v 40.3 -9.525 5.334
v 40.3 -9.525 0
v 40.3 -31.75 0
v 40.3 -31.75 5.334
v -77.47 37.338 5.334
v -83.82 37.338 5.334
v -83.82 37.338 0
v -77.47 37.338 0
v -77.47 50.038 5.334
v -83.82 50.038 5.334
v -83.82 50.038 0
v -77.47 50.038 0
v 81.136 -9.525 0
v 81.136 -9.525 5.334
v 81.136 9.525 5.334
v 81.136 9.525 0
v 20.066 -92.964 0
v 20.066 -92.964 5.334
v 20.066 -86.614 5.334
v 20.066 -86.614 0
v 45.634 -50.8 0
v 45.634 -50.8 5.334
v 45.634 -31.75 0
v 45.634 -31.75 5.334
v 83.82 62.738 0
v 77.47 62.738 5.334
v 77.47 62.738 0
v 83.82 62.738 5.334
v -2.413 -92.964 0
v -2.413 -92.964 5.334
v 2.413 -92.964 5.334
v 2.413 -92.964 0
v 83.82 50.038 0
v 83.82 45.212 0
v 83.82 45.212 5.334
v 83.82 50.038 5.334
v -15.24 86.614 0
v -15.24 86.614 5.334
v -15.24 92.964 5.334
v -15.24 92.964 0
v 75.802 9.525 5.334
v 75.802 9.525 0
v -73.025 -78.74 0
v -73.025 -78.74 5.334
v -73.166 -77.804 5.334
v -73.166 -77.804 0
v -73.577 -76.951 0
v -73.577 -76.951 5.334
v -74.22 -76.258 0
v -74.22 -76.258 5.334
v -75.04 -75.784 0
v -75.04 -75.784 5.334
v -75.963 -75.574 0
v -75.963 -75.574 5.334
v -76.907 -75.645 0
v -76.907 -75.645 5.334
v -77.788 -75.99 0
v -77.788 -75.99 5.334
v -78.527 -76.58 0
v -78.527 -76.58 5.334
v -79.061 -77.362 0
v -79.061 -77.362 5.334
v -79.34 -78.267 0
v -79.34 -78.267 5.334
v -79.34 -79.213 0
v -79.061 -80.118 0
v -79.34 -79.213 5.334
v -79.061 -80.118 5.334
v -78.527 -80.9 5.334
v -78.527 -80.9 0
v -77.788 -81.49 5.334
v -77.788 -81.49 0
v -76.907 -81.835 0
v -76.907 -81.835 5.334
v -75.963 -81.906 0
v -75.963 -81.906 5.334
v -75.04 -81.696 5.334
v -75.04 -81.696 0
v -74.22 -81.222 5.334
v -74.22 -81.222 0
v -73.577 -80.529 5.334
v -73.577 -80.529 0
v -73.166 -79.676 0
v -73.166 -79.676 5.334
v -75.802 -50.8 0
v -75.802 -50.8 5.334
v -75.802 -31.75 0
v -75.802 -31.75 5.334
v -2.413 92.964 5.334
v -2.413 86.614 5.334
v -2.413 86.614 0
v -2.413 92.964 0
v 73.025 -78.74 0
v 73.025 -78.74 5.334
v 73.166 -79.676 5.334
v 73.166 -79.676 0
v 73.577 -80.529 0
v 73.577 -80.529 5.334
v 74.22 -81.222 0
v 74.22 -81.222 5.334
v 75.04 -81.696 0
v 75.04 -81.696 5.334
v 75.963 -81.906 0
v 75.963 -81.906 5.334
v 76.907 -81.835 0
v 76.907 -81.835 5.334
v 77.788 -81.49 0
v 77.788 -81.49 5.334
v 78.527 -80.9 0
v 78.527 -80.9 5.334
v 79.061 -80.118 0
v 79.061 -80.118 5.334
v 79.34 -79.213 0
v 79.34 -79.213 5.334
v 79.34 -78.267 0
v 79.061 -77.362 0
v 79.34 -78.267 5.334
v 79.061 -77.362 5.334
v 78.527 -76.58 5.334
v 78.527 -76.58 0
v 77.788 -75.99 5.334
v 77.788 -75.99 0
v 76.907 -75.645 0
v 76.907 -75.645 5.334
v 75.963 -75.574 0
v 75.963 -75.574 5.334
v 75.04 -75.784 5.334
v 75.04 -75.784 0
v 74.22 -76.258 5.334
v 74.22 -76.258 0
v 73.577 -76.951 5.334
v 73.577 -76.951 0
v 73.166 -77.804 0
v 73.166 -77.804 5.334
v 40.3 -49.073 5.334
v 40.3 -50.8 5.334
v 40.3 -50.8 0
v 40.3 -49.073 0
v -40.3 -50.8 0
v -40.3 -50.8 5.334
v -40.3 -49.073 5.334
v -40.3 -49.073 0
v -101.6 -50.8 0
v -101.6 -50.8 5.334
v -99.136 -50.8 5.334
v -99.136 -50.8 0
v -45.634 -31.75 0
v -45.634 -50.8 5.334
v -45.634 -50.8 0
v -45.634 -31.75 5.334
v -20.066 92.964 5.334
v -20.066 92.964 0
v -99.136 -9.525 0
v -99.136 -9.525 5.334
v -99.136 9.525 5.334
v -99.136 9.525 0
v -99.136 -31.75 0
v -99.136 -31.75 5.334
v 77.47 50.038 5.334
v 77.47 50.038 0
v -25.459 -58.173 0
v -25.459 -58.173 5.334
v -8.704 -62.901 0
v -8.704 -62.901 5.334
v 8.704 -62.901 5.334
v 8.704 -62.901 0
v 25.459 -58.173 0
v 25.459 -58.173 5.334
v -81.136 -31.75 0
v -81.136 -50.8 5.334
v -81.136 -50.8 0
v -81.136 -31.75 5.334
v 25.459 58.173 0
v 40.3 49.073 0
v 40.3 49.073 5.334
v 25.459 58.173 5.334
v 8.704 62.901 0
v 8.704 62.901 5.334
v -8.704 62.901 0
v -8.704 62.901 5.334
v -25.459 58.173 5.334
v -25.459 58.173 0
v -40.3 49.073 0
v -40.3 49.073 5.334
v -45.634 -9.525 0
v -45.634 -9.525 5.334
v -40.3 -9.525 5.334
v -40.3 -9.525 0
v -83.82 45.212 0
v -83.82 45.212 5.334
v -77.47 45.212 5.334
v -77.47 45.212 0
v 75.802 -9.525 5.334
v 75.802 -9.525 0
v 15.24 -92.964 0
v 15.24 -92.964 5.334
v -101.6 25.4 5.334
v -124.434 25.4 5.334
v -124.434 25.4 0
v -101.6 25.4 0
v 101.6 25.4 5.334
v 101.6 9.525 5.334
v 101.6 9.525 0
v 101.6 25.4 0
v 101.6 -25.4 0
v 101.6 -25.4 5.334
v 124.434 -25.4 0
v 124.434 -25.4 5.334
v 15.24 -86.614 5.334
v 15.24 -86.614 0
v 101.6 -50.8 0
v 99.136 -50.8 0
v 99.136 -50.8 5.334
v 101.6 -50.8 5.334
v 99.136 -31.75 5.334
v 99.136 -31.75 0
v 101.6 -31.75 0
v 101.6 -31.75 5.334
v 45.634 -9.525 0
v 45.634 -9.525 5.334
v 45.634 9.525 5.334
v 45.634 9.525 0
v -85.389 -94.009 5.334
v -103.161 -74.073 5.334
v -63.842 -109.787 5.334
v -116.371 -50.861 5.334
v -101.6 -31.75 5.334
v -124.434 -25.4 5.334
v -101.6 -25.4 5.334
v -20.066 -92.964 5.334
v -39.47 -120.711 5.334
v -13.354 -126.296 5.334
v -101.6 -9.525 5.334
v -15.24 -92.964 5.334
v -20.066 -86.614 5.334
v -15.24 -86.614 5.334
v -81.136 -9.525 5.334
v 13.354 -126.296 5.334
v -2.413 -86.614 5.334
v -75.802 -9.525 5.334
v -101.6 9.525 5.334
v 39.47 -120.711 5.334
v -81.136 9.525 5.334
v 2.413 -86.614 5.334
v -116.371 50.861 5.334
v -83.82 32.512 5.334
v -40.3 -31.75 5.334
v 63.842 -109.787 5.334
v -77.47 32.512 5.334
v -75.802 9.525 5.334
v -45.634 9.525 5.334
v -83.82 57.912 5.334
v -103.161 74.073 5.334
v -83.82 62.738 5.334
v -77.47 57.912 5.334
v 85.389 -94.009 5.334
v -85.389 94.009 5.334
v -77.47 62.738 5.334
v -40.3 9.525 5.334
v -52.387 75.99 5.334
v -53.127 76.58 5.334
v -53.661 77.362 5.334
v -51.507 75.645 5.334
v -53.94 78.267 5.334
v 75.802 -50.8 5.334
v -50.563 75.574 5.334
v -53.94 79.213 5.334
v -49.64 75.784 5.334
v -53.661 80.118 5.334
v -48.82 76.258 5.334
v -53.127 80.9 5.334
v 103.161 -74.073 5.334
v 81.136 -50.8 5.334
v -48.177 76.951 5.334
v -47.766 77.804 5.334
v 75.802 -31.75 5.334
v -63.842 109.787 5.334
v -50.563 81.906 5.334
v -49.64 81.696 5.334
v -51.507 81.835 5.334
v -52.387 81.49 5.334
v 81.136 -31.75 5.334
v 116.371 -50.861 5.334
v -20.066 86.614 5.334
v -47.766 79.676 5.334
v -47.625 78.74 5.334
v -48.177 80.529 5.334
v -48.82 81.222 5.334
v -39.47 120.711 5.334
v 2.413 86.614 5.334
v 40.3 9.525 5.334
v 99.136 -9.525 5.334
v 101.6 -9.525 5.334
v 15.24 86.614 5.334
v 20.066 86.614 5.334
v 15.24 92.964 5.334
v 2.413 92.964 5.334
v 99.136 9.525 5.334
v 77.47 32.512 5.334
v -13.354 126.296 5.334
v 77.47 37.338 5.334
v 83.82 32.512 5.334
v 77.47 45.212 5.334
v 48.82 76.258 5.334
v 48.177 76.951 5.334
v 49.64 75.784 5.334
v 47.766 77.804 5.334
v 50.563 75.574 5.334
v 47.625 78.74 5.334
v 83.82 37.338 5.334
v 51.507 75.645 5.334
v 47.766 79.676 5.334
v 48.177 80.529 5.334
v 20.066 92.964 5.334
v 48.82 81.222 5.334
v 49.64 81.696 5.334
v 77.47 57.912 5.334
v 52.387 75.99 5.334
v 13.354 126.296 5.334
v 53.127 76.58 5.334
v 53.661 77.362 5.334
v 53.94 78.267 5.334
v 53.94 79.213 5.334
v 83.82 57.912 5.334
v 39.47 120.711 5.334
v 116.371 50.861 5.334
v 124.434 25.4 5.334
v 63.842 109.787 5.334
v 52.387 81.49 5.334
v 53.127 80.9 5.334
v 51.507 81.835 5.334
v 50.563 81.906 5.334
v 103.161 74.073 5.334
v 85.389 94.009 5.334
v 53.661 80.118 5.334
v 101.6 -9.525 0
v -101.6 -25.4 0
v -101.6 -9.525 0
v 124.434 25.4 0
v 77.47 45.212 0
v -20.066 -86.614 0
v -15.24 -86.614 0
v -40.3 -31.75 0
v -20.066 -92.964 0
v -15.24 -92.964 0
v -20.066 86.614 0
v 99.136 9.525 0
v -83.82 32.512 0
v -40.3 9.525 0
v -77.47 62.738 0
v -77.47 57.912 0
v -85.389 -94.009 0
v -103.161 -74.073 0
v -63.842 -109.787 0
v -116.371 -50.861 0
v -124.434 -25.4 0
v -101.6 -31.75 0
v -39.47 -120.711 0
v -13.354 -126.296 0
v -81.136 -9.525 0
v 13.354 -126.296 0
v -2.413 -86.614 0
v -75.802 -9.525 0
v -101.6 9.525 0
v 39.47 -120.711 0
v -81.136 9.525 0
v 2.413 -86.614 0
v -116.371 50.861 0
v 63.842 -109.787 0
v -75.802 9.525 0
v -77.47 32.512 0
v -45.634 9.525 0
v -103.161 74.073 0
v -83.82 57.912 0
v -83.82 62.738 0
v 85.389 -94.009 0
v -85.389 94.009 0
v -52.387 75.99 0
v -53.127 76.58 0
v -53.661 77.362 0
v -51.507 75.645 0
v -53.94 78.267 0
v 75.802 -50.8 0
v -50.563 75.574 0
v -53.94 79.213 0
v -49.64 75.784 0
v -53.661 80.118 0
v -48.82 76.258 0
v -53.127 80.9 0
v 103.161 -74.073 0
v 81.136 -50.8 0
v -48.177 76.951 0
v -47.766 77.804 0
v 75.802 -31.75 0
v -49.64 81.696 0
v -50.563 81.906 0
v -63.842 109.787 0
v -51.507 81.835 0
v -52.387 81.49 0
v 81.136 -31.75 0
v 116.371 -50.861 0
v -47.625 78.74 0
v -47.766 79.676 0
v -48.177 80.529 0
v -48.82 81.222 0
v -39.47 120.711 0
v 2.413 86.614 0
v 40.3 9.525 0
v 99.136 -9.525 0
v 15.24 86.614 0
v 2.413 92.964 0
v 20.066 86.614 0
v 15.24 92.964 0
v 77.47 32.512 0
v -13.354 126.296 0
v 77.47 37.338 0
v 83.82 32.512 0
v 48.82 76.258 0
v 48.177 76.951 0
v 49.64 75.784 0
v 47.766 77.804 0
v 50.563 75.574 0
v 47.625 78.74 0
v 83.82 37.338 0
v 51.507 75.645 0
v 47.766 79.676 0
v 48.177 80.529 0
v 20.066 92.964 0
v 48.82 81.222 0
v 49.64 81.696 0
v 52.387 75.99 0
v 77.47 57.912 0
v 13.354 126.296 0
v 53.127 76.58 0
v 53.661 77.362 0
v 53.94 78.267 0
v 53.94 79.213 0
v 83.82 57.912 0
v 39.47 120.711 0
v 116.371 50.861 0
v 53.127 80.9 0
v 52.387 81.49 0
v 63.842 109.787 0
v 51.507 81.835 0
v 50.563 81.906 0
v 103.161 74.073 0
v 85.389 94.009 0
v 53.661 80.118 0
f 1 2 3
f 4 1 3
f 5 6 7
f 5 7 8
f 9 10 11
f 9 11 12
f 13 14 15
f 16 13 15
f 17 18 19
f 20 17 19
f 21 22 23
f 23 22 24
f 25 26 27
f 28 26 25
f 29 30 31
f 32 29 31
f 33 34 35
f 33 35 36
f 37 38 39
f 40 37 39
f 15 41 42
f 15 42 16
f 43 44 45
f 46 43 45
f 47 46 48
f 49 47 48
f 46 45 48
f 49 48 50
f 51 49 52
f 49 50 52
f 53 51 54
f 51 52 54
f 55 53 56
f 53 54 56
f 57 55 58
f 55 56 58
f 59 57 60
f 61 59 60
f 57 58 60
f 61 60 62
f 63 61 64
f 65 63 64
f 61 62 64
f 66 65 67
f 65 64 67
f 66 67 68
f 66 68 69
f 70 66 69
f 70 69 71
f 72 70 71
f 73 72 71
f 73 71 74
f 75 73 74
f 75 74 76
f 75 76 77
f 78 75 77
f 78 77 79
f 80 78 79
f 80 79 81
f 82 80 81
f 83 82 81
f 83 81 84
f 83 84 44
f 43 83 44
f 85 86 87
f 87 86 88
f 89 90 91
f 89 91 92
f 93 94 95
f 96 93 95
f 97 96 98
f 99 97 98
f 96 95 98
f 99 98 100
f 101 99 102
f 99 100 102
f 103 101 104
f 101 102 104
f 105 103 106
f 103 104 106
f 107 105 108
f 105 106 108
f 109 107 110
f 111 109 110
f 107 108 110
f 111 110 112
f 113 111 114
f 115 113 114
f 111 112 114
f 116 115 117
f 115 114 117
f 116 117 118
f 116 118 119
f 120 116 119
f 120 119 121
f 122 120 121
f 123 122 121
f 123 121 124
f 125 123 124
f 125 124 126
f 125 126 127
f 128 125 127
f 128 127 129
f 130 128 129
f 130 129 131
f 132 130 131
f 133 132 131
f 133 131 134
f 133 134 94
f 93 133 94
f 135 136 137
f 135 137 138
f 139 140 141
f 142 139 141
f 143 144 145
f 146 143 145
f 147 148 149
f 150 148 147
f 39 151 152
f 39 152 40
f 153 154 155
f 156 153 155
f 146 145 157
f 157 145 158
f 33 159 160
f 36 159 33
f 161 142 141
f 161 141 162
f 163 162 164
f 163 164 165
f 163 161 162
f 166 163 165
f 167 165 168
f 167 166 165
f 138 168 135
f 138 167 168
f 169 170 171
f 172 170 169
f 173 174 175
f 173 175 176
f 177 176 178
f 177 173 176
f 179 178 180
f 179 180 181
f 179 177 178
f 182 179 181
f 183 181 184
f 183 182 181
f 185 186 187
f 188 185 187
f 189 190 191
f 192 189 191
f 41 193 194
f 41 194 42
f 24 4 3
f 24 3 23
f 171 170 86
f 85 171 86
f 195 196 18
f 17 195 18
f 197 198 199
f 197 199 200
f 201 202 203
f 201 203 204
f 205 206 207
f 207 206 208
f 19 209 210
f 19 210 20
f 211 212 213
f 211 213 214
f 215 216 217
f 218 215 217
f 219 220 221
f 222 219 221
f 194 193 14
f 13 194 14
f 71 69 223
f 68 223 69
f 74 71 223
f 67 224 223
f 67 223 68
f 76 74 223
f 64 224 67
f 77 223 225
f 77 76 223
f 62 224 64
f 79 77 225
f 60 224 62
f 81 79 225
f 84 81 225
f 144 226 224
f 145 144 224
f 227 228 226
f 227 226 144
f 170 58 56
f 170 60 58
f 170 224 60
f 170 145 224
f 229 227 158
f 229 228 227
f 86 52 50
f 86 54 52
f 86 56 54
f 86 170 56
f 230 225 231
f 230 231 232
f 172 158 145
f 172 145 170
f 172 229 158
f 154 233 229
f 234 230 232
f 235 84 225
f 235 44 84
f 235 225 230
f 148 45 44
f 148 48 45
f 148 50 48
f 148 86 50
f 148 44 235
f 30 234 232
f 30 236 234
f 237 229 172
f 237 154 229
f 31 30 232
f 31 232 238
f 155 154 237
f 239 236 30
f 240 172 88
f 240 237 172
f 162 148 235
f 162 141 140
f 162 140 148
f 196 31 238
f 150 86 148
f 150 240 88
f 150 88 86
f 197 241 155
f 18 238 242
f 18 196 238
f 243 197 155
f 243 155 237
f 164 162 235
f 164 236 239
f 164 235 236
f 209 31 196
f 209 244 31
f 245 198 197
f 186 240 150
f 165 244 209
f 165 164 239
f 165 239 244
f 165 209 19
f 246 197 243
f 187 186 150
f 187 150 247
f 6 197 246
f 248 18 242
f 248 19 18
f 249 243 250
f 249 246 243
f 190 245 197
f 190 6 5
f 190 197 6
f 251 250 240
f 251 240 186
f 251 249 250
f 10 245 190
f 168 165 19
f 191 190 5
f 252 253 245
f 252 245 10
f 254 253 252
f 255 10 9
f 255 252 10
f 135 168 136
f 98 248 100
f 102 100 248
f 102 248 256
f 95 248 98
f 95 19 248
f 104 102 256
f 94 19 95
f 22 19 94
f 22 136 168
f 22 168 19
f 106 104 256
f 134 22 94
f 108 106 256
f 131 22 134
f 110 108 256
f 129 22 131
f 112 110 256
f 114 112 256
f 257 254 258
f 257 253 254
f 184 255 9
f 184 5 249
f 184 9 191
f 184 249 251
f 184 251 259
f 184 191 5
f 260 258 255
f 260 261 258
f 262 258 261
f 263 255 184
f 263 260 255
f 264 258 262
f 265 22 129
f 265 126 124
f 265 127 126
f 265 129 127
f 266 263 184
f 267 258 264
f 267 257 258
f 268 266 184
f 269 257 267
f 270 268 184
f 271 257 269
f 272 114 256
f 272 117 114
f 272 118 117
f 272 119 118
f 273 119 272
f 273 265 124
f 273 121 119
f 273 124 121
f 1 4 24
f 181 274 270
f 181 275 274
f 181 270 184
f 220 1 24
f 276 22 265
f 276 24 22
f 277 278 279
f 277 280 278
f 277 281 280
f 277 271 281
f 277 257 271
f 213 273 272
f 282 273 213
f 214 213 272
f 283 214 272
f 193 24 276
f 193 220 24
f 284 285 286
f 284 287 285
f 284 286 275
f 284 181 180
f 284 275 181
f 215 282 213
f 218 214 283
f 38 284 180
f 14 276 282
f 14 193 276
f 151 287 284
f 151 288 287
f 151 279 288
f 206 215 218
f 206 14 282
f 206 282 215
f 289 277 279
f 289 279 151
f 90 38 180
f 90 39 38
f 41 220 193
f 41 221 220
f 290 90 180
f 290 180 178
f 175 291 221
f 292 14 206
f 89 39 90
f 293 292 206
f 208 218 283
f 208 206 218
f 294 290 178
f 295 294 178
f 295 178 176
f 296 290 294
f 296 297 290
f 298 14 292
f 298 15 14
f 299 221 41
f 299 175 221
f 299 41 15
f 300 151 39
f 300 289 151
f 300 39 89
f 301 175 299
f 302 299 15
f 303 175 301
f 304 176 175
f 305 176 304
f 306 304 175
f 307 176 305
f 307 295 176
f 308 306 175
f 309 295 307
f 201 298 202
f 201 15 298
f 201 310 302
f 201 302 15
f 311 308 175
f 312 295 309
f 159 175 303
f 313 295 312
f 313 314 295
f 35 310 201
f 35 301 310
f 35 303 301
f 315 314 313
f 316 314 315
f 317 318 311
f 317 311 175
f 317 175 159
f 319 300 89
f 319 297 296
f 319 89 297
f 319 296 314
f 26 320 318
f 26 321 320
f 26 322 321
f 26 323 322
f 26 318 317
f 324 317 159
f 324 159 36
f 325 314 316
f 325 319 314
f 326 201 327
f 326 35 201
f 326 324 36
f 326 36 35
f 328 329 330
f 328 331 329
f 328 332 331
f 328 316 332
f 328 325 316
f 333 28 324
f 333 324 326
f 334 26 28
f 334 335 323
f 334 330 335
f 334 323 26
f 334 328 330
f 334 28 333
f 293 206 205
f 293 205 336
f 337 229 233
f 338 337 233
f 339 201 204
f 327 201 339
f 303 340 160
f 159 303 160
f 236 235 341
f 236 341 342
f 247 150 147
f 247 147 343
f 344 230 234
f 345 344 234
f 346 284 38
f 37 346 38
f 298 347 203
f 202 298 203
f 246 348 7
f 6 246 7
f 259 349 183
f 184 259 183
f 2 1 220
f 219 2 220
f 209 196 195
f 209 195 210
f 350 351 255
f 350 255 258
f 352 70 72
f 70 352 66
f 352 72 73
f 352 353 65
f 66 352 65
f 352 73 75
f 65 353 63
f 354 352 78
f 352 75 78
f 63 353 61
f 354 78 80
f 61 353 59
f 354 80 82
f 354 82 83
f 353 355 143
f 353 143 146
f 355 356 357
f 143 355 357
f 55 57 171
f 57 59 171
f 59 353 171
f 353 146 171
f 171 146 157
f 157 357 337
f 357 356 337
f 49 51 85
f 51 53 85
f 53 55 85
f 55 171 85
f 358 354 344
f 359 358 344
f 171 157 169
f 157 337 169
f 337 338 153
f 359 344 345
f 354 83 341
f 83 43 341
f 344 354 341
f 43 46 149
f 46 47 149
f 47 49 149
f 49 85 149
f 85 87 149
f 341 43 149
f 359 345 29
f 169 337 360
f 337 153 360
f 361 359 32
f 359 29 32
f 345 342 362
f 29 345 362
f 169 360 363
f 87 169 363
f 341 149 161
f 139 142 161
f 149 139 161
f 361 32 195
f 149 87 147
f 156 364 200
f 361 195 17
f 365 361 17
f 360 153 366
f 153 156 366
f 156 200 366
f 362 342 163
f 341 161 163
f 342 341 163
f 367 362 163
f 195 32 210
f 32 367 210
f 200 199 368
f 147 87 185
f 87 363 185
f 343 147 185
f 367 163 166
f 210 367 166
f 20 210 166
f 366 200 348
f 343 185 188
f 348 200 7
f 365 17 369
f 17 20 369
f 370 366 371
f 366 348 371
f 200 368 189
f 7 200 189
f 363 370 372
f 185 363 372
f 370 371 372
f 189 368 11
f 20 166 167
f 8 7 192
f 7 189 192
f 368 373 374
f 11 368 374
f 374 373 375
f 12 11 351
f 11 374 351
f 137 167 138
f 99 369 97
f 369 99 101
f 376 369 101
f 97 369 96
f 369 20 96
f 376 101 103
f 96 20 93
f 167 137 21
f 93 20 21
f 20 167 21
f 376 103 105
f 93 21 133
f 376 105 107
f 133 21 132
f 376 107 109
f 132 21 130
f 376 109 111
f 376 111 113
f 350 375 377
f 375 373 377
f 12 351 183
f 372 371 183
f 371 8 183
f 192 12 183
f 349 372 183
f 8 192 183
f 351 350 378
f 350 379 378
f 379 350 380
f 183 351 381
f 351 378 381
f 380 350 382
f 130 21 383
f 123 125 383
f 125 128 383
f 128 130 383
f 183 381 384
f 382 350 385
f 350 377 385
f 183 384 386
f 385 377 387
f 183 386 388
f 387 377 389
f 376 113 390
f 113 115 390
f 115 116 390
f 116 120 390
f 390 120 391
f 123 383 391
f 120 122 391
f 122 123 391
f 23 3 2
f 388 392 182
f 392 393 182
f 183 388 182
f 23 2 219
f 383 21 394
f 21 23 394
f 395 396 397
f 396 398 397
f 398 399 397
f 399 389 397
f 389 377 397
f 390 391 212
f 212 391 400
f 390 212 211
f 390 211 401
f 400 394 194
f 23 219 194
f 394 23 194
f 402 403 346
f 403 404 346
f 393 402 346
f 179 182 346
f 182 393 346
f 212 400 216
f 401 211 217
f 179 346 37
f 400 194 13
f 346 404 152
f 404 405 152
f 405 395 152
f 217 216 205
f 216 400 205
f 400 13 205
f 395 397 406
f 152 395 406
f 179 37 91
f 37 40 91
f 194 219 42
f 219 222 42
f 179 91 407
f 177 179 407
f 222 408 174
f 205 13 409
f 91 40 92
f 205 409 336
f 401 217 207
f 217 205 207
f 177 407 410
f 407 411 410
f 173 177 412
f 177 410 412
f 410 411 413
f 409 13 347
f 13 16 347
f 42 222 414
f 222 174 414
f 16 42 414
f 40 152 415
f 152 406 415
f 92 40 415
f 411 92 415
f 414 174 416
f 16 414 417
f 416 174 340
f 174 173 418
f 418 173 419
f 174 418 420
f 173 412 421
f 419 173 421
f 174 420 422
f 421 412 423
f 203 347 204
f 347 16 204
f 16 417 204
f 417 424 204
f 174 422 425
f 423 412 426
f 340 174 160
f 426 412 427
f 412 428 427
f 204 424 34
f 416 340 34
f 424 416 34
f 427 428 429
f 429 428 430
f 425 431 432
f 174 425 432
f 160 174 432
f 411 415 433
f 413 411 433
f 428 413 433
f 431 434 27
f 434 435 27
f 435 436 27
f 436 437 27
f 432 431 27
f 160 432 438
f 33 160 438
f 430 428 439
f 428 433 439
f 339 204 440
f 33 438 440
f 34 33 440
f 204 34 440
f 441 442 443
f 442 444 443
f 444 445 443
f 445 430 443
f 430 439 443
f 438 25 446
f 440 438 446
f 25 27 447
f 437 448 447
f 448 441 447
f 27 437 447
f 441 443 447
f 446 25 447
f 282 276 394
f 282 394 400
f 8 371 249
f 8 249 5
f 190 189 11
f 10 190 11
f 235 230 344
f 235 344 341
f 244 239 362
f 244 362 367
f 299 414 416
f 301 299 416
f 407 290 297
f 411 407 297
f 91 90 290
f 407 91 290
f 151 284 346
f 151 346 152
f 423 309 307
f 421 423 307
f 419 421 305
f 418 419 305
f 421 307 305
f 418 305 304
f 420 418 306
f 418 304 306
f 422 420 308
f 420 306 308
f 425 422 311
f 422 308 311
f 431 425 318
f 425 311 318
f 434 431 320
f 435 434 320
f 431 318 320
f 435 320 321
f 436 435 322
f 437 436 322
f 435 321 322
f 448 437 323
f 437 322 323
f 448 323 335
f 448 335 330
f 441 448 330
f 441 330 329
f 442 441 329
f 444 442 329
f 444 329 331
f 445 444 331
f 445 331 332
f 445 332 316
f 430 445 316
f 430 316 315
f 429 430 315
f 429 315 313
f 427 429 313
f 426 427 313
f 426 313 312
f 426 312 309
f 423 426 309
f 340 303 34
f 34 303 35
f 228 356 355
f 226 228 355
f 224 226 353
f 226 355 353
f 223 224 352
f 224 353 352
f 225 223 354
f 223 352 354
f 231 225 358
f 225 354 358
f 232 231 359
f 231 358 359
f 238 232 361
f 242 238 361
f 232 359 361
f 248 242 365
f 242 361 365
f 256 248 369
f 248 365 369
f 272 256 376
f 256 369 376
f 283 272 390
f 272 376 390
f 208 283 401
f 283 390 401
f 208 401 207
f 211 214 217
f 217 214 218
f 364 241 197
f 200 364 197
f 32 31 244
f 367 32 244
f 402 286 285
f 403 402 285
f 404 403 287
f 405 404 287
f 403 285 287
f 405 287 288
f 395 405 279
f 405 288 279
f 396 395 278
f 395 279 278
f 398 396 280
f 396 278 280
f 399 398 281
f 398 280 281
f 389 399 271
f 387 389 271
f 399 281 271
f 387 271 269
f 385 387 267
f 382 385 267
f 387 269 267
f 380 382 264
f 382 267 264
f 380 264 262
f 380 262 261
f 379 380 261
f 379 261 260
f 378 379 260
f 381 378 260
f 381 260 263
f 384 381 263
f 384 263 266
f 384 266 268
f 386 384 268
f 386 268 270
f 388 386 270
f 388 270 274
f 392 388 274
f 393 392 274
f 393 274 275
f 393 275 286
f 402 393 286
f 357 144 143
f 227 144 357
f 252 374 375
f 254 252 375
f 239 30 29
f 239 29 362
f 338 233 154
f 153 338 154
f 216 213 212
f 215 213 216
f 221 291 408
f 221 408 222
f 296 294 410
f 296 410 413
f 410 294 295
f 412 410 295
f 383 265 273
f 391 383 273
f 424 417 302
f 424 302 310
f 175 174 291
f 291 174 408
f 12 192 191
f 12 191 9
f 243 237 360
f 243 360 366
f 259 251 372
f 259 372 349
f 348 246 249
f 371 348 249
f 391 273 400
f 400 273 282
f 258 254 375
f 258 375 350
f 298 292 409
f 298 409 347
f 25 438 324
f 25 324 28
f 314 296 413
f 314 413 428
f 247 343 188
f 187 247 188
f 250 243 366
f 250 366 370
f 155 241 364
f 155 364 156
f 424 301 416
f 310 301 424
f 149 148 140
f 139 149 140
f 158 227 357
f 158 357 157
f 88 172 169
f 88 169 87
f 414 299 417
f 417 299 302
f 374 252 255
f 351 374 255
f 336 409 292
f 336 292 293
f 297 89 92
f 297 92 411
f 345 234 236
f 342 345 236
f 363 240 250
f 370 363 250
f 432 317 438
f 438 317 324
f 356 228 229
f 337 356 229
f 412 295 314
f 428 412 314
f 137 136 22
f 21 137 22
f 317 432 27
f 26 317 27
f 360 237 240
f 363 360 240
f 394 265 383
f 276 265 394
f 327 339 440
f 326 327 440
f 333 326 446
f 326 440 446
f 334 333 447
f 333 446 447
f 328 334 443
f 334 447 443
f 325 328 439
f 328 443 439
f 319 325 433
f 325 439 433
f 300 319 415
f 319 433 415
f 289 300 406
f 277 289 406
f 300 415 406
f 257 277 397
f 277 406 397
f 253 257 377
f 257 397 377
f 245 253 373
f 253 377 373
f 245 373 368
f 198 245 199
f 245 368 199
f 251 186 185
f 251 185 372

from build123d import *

# Parameters (mm, degrees)
SKETCH1_R           = 127
SKETCH1_R_2         = 63.5
BOSS_EXTRUDE1_DEPTH = 5.334
SKETCH2_W           = 50.8
SKETCH2_H           = 50.8
WHEELSCUT_DEPTH     = 180.684310823
SKETCH3_W           = 4.826
SKETCH3_H           = 6.35
TOPBOTTOMCUT_DEPTH  = 178.879992006
SKETCH4_W           = 6.35
SKETCH4_H           = 4.826
SIDECUT_DEPTH       = 178.879992006
SKETCH14_R          = 3.175
BOLTHOLES_DEPTH     = 178.879992006
SKETCH15_W          = 2.4638
SKETCH15_H          = 19.05
SKETCH15_W_2        = 5.334
MOTORMOUNTS_DEPTH   = 178.879992006


with BuildPart() as part:
    # Sketch1 → Boss-Extrude1 (new body)
    # profile 1 of 3: a face of its own
    with BuildSketch(Plane.XY):
        Circle(SKETCH1_R)
        Circle(SKETCH1_R_2, mode=Mode.SUBTRACT)
    # profile 2 of 3: a face of its own
    with BuildSketch(Plane.XY):
        with BuildLine():
            Line((-40.299999918, -49.073006904), (-40.299999918, 49.073006904))
            ThreePointArc((-40.299999918, 49.073006904), (-63.5, 0), (-40.299999918, -49.073006904))
        make_face()
    # profile 3 of 3: a face of its own
    with BuildSketch(Plane.XY):
        with BuildLine():
            ThreePointArc((63.5, 0), (57.407752067, 27.140375874), (40.299999918, 49.073006904))
            Line((40.299999918, 49.073006904), (40.299999918, -49.073006904))
            ThreePointArc((40.299999918, -49.073006904), (57.407752067, -27.140375874), (63.5, 0))
        make_face()
    extrude(amount=BOSS_EXTRUDE1_DEPTH)

    # Sketch2 → WheelsCut (cut, through all)
    with BuildSketch(Plane.XY.offset(5.334)):
        with Locations((-127, 0)):
            Rectangle(SKETCH2_W, SKETCH2_H)
        with Locations((127, 0)):
            Rectangle(SKETCH2_W, SKETCH2_H)
    extrude(amount=-WHEELSCUT_DEPTH, mode=Mode.SUBTRACT)

    # Sketch3 → TopBottomCut (cut, through all)
    with BuildSketch(Plane.XY.offset(5.334)):
        with Locations((-17.653, 89.789)):
            Rectangle(SKETCH3_W, SKETCH3_H)
        with Locations((17.653, 89.789)):
            Rectangle(SKETCH3_W, SKETCH3_H)
        with Locations((0, -89.789)):
            Rectangle(SKETCH3_W, SKETCH3_H)
        with Locations((0, 89.789)):
            Rectangle(SKETCH3_W, SKETCH3_H)
        with Locations((17.653, -89.789)):
            Rectangle(SKETCH3_W, SKETCH3_H)
        with Locations((-17.653, -89.789)):
            Rectangle(SKETCH3_W, SKETCH3_H)
    extrude(amount=-TOPBOTTOMCUT_DEPTH, mode=Mode.SUBTRACT)

    # Sketch4 → SideCut (cut, through all)
    with BuildSketch(Plane.XY.offset(5.334)):
        with Locations((-80.645, 47.625)):
            Rectangle(SKETCH4_W, SKETCH4_H)
        with Locations((-80.645, 34.925)):
            Rectangle(SKETCH4_W, SKETCH4_H)
        with Locations((-80.645, 60.325)):
            Rectangle(SKETCH4_W, SKETCH4_H)
        with Locations((80.645, 60.325)):
            Rectangle(SKETCH4_W, SKETCH4_H)
        with Locations((80.645, 47.625)):
            Rectangle(SKETCH4_W, SKETCH4_H)
        with Locations((80.645, 34.925)):
            Rectangle(SKETCH4_W, SKETCH4_H)
    extrude(amount=-SIDECUT_DEPTH, mode=Mode.SUBTRACT)

    # Sketch14 → BoltHoles (cut, through all)
    with BuildSketch(Plane.XY.offset(5.334)):
        with Locations((-76.2, -78.74)):
            Circle(SKETCH14_R)
        with Locations((-50.8, 78.74)):
            Circle(SKETCH14_R)
        with Locations(Location((76.2, -78.74, 0), (0, 0, 180))):
            Circle(SKETCH14_R)
        with Locations(Location((50.8, 78.74, 0), (0, 0, 180))):
            Circle(SKETCH14_R)
    extrude(amount=-BOLTHOLES_DEPTH, mode=Mode.SUBTRACT)

    # Sketch15 → MotorMounts (cut, through all)
    with BuildSketch(Plane.XY.offset(5.334)):
        with Locations((-100.3681, -41.275)):
            Rectangle(SKETCH15_W, SKETCH15_H)
        with Locations((-100.3681, 0)):
            Rectangle(SKETCH15_W, SKETCH15_H)
        with Locations((-78.469199932, 0)):
            Rectangle(SKETCH15_W_2, SKETCH15_H)
        with Locations((-42.966999918, 0)):
            Rectangle(SKETCH15_W_2, SKETCH15_H)
        with Locations((-78.469199932, -41.275)):
            Rectangle(SKETCH15_W_2, SKETCH15_H)
        with Locations((-42.966999918, -41.275)):
            Rectangle(SKETCH15_W_2, SKETCH15_H)
        with Locations((42.966999918, -41.275)):
            Rectangle(SKETCH15_W_2, SKETCH15_H)
        with Locations((78.469199932, -41.275)):
            Rectangle(SKETCH15_W_2, SKETCH15_H)
        with Locations((100.3681, -41.275)):
            Rectangle(SKETCH15_W, SKETCH15_H)
        with Locations((42.966999918, 0)):
            Rectangle(SKETCH15_W_2, SKETCH15_H)
        with Locations((78.469199932, 0)):
            Rectangle(SKETCH15_W_2, SKETCH15_H)
        with Locations((100.3681, 0)):
            Rectangle(SKETCH15_W, SKETCH15_H)
    extrude(amount=-MOTORMOUNTS_DEPTH, mode=Mode.SUBTRACT)


solid = part.part
